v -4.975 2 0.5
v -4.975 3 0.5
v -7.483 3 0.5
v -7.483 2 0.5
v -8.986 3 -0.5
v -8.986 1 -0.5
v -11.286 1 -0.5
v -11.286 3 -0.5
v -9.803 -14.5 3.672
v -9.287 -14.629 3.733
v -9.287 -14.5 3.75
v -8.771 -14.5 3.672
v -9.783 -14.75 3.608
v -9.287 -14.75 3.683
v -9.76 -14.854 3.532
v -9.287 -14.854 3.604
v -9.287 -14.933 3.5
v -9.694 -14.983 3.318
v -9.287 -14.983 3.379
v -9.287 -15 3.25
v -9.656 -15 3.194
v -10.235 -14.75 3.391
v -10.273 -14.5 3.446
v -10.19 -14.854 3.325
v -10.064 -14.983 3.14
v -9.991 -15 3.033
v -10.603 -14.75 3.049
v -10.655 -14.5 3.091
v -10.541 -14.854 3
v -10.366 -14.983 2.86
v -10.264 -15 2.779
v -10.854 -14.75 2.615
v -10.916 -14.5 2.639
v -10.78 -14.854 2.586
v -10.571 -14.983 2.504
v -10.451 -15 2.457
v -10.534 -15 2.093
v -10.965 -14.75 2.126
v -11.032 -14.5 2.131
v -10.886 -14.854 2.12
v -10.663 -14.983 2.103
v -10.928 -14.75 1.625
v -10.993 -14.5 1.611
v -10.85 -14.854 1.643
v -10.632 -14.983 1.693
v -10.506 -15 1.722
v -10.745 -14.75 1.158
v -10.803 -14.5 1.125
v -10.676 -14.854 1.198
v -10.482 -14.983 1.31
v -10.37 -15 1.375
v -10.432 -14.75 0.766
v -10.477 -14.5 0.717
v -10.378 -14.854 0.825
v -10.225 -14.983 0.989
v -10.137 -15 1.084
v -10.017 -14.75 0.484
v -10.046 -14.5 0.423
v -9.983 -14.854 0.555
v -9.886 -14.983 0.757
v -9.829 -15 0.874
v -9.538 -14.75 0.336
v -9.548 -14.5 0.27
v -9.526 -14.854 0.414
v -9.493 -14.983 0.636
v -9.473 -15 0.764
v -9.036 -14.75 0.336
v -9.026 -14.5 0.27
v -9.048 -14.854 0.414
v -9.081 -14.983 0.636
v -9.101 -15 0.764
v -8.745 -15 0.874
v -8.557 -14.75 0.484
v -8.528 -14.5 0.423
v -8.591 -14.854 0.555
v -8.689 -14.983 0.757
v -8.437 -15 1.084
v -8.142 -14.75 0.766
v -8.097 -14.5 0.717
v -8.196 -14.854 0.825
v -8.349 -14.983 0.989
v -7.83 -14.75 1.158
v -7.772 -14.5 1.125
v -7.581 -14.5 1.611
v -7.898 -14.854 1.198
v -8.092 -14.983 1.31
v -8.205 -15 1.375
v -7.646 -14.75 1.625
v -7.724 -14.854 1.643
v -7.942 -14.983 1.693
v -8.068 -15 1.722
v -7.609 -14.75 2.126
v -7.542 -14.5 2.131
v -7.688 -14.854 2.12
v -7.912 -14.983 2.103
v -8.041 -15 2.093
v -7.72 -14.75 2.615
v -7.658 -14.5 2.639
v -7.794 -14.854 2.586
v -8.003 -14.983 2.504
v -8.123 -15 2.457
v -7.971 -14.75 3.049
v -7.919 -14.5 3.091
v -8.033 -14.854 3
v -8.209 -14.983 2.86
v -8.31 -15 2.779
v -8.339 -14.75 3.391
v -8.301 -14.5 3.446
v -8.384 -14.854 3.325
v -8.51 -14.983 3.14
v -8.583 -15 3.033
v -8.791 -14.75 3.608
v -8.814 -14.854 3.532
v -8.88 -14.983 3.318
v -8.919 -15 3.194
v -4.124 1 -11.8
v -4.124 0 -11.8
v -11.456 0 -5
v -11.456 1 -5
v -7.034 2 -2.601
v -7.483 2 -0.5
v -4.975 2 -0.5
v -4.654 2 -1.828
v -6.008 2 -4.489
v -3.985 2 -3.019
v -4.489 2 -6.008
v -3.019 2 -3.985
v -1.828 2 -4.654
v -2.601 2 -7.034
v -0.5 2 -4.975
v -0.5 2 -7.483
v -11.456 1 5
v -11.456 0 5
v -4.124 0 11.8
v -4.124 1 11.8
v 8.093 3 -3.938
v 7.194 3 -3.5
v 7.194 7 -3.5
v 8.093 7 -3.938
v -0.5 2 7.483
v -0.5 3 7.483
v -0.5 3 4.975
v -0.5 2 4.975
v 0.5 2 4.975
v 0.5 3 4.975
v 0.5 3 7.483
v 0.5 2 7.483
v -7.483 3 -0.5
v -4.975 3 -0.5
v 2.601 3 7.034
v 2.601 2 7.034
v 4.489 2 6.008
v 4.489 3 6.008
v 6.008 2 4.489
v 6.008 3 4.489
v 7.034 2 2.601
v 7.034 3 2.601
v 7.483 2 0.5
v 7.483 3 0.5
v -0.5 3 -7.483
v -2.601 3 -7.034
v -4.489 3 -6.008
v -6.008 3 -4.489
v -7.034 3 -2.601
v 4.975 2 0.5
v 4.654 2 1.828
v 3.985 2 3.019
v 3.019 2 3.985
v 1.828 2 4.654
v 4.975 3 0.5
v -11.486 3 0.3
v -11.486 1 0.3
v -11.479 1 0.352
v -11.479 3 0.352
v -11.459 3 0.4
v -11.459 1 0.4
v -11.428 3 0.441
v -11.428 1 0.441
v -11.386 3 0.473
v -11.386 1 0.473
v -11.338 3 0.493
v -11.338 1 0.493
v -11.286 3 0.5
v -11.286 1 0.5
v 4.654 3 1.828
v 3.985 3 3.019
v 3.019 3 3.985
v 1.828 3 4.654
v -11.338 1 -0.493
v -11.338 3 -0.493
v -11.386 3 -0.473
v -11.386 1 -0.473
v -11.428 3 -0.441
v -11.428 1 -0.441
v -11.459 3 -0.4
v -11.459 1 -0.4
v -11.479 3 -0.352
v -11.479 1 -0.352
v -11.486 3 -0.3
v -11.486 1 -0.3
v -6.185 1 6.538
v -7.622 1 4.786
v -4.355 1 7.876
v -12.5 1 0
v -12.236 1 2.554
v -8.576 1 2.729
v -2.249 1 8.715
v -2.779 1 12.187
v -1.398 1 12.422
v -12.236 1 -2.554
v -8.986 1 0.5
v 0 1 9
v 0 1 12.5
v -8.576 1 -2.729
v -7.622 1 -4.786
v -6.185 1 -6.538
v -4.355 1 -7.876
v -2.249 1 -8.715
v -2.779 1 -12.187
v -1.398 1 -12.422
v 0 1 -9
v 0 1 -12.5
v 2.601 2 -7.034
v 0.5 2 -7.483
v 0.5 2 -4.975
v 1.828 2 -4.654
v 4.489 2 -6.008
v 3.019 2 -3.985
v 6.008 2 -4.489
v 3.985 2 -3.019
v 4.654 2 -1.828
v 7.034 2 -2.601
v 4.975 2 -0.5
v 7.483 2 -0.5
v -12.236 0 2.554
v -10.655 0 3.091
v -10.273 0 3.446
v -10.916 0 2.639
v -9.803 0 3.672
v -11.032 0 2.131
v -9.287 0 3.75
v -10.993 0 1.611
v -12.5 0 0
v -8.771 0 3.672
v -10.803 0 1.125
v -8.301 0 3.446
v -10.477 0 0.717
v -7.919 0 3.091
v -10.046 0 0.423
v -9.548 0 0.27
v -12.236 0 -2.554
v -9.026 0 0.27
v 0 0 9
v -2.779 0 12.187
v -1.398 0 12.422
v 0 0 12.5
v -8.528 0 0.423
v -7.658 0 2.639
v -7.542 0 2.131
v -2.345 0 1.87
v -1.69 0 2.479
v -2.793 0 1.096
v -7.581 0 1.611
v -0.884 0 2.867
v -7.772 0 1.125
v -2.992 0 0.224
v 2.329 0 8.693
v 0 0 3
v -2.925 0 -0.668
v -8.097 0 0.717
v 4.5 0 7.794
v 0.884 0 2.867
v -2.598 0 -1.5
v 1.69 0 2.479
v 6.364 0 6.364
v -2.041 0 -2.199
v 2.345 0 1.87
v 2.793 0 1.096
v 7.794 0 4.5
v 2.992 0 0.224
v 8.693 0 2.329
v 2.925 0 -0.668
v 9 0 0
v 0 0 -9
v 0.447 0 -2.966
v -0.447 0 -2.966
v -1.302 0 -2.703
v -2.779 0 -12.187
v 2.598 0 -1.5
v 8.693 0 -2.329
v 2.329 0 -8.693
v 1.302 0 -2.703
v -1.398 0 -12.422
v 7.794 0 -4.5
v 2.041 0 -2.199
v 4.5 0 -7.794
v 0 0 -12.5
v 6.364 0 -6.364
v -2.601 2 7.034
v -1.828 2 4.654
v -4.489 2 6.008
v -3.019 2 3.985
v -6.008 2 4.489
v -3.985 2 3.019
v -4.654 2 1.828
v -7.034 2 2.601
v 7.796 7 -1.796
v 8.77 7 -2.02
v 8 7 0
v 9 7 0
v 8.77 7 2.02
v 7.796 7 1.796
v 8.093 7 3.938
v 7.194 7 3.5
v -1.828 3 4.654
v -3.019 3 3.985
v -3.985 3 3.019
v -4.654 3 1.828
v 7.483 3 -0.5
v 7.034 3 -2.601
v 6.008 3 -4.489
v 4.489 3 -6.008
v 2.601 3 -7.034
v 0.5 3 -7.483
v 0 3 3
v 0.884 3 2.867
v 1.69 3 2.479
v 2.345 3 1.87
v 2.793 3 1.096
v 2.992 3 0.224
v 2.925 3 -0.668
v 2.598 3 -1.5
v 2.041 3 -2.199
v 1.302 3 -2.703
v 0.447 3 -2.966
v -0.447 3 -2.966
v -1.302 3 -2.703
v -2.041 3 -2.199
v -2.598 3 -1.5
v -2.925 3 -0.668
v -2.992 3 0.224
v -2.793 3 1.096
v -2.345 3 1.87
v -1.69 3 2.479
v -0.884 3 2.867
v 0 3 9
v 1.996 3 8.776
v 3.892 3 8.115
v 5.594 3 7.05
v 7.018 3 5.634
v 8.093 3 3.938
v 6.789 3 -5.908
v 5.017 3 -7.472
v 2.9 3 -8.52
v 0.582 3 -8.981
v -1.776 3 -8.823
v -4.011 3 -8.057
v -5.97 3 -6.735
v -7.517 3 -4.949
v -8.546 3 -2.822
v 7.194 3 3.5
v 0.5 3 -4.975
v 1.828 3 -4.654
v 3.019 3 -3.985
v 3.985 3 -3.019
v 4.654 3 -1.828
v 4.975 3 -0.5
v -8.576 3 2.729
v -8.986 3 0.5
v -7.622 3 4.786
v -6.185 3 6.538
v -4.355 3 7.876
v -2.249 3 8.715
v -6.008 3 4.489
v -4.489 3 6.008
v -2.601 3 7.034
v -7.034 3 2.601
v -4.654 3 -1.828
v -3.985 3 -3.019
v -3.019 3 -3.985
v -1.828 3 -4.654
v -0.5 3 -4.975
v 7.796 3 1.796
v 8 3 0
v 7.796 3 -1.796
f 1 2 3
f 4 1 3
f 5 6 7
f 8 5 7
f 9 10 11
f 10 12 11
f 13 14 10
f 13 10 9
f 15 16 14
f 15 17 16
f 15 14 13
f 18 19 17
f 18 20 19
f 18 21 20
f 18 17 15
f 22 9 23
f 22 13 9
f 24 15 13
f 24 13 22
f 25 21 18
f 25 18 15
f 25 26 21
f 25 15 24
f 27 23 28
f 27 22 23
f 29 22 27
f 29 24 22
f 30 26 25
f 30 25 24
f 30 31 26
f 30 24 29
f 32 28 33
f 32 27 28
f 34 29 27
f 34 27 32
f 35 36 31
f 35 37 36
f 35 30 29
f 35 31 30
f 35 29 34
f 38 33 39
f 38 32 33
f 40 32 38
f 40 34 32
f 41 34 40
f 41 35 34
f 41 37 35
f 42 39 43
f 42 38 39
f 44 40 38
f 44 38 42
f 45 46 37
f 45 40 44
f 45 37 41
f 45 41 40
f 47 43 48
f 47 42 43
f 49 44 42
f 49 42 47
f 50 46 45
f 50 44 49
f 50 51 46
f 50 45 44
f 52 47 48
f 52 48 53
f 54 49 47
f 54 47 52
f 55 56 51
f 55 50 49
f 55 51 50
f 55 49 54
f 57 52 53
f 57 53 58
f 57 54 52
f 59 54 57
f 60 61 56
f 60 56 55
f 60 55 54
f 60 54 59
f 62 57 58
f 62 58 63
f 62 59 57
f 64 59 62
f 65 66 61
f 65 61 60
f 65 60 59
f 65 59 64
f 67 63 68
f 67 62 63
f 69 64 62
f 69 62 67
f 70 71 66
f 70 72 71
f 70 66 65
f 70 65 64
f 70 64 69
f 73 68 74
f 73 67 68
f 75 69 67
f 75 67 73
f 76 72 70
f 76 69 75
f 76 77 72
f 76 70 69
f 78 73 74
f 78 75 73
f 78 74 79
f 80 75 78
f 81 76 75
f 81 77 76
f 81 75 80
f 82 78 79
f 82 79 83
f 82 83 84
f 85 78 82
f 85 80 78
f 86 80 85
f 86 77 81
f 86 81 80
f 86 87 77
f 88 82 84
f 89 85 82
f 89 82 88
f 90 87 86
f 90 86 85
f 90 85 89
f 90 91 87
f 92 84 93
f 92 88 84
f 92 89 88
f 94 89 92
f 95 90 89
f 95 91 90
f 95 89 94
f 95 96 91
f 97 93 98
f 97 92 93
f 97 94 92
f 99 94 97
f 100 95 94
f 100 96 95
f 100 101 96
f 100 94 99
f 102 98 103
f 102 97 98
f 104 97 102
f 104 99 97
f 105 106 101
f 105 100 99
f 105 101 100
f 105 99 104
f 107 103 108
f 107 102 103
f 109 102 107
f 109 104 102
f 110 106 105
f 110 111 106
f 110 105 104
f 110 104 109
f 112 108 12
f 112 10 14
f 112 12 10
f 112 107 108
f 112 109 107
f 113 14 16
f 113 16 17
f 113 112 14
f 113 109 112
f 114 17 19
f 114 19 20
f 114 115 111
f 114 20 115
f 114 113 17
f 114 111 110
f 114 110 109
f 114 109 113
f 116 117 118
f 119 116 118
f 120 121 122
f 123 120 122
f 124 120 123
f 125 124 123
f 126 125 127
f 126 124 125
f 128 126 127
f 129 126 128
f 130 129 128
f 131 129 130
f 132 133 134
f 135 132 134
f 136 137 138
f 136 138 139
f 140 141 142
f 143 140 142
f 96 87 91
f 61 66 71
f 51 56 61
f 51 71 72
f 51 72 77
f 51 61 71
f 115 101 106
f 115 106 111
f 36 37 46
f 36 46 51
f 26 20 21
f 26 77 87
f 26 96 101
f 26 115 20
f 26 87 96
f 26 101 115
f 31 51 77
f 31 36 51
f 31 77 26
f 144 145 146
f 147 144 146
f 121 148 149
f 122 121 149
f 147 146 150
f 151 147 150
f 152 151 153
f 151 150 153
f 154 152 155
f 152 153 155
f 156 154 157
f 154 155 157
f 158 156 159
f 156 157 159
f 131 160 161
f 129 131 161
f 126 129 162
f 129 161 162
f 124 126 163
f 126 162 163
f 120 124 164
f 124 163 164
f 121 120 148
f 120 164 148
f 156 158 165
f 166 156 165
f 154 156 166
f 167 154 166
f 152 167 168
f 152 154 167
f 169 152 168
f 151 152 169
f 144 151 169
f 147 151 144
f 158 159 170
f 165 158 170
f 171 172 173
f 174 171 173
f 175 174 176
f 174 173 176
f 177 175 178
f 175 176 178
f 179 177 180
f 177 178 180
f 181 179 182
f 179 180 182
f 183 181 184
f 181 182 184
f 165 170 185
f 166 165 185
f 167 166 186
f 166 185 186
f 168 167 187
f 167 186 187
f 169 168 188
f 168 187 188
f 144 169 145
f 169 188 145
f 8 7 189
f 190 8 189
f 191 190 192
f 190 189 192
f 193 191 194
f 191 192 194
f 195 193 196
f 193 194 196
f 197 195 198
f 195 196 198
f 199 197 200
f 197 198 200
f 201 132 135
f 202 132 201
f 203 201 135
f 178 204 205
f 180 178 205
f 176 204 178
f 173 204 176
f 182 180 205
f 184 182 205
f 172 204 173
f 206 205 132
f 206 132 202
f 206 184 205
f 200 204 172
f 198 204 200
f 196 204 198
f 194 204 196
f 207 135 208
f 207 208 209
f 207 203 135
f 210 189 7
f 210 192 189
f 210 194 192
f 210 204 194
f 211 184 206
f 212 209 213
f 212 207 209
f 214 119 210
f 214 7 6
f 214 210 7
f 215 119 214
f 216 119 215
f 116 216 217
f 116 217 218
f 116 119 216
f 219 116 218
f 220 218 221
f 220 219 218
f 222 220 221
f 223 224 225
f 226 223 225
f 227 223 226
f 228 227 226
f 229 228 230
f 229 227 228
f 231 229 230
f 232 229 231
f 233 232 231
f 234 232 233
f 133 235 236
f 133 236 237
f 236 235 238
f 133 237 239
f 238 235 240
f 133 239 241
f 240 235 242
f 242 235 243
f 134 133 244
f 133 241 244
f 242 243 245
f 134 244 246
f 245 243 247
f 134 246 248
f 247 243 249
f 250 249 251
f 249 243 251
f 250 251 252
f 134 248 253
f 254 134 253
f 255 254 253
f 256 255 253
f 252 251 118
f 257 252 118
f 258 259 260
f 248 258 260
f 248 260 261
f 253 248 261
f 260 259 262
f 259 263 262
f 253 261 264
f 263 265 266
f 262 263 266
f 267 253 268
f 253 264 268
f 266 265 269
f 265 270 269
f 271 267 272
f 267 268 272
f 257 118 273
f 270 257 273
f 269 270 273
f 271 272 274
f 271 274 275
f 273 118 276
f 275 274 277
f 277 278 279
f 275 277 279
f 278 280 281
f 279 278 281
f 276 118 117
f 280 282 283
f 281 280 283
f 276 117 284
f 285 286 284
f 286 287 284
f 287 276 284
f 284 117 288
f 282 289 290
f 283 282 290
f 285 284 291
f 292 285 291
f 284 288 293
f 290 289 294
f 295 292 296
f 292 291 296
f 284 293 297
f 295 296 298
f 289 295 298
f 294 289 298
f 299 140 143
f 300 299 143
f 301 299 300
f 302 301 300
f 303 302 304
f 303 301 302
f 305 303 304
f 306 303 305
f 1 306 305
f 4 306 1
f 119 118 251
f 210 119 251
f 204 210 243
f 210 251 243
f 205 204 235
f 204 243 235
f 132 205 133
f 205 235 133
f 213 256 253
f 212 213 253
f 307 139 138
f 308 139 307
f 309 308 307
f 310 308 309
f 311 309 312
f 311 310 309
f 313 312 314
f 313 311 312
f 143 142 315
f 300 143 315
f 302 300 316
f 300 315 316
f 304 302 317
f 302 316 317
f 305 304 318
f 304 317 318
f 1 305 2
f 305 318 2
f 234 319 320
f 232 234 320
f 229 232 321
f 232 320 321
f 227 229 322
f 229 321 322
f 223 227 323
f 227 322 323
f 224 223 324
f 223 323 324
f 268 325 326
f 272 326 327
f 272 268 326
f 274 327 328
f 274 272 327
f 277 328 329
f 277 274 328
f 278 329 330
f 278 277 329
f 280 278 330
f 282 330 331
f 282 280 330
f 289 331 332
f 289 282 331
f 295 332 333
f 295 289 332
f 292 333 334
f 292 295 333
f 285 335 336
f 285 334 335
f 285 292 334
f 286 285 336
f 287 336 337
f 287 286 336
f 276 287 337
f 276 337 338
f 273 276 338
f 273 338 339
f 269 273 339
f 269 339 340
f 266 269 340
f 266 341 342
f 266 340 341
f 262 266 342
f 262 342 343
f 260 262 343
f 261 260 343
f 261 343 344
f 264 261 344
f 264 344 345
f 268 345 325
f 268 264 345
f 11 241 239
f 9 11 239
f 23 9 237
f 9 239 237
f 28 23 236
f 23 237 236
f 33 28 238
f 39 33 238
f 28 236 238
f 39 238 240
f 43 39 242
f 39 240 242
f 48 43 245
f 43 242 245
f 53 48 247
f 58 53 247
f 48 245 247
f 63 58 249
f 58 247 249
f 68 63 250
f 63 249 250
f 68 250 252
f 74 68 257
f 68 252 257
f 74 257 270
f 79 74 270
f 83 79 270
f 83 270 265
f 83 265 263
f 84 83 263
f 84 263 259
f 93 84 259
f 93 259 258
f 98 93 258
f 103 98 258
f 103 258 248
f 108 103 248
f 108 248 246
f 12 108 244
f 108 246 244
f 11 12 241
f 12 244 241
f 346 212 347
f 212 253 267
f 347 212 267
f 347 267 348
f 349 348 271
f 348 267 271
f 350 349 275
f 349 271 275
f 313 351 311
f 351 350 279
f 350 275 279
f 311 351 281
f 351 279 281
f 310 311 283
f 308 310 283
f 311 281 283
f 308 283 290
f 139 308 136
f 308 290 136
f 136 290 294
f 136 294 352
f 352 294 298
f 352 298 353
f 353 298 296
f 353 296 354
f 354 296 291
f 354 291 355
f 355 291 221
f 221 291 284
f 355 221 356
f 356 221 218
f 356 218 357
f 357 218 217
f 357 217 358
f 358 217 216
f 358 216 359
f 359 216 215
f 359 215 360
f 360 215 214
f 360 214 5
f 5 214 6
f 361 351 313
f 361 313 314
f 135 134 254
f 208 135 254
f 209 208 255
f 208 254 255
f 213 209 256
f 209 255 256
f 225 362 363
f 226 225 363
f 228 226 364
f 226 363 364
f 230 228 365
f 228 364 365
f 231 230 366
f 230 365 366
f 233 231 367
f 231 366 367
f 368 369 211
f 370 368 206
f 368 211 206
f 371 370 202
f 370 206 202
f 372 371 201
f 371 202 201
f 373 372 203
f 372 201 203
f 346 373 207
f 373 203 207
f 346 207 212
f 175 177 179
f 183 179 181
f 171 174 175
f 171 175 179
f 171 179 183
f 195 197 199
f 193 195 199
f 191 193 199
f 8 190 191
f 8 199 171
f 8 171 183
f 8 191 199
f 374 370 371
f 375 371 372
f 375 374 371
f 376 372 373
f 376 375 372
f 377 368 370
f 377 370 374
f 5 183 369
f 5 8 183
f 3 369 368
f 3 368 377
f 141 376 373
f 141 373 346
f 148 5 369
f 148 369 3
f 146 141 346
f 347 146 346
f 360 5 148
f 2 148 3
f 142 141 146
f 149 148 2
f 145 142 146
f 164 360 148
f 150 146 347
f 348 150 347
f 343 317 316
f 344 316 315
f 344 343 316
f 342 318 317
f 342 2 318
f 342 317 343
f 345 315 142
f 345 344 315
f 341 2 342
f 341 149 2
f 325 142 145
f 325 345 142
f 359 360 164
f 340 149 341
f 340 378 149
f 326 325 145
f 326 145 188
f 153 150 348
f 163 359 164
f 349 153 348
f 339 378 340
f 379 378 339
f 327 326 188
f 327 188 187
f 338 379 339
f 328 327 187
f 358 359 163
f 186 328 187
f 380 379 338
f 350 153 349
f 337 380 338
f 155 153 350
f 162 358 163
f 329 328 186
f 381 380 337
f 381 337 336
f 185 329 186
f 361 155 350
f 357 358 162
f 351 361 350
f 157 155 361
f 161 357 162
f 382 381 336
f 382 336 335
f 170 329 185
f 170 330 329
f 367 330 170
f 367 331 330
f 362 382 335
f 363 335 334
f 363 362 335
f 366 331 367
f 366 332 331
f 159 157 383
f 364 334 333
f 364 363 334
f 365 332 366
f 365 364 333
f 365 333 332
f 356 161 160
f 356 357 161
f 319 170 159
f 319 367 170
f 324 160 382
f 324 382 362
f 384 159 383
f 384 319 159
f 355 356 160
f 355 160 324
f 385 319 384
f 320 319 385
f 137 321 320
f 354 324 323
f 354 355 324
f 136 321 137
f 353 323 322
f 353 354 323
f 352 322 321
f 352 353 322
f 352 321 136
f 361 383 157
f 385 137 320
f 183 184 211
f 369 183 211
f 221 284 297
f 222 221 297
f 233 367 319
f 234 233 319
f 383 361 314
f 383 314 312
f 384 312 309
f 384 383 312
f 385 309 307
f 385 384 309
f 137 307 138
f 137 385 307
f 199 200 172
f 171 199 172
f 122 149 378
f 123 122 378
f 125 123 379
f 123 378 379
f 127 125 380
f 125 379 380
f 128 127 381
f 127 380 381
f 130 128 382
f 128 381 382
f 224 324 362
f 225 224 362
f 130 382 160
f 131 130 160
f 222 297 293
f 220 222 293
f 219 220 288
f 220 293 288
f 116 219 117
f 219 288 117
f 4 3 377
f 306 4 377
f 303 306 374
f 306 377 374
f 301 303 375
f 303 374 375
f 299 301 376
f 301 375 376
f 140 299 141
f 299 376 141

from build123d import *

# Parameters (mm, degrees)
SCHIZZO1_R                   = 9
SCHIZZO1_R_2                 = 3
ESTRUSIONE_ESTRUSIONE1_DEPTH = 7
TAGLIO_ESTRUSIONE1_START     = -4
TAGLIO_ESTRUSIONE1_DEPTH     = 4
TAGLIO_ESTRUSIONE2_DEPTH     = 1
RIPETIZIONECIRCOLARE1_COUNT  = 4
ESTRUSIONE_ESTRUSIONE2_DEPTH = 1
ESTRUSIONE_ESTRUSIONE3_DEPTH = 2
SCHIZZO7_R                   = 1.75
ESTRUSIONE_ESTRUSIONE4_DEPTH = 15
RACCORDO1_R                  = 0.5


with BuildPart() as part:
    # Schizzo1 → Estrusione-Estrusione1 (new body)
    with BuildSketch(Plane(origin=(0, 0, 0), x_dir=(1, 0, 0), z_dir=(0, 1, 0))):
        with Locations(Location((0, 0, 0), (0, 0, 270))):
            Circle(SCHIZZO1_R)
        with Locations(Location((0, 0, 0), (0, 0, 270))):
            Circle(SCHIZZO1_R_2, mode=Mode.SUBTRACT)
    extrude(amount=ESTRUSIONE_ESTRUSIONE1_DEPTH)

    # Schizzo3 → Taglio-Estrusione1 (cut)
    with BuildSketch(Plane(origin=(0, 7, 0), x_dir=(1, 0, 0), z_dir=(0, 1, 0)).offset(TAGLIO_ESTRUSIONE1_START)):
        with BuildLine():
            Line((7.193747285, 3.5), (8.092965696, 3.9375))
            ThreePointArc((8.092965696, 3.9375), (-9, 0), (8.092965696, -3.9375))
            Line((8.092965696, -3.9375), (7.193747285, -3.5))
            ThreePointArc((7.193747285, -3.5), (8, 0), (7.193747285, 3.5))
        make_face()
    extrude(amount=TAGLIO_ESTRUSIONE1_DEPTH, mode=Mode.SUBTRACT)

    # Schizzo4 → Taglio-Estrusione2 (cut)
    with BuildSketch(Plane(origin=(0, 3, 0), x_dir=(1, 0, 0), z_dir=(0, 1, 0))):
        with BuildLine():
            Line((-0.5, 4.974937186), (-0.5, 7.483314774))
            ThreePointArc((-0.5, 7.483314774), (-5.303300859, 5.303300859), (-7.483314774, 0.5))
            Line((-7.483314774, 0.5), (-4.974937186, 0.5))
            ThreePointArc((-4.974937186, 0.5), (-3.535533906, 3.535533906), (-0.5, 4.974937186))
        make_face()
    taglio_estrusione2 = extrude(amount=-TAGLIO_ESTRUSIONE2_DEPTH, mode=Mode.SUBTRACT)

    # RipetizioneCircolare1: Taglio-Estrusione2 ×4 about axis
    ripetizionecircolare1_axis = Axis((0, 0, 0), (0, 1, 0))
    for i in range(1, RIPETIZIONECIRCOLARE1_COUNT):
        add(taglio_estrusione2.rotate(ripetizionecircolare1_axis, i * 360 / RIPETIZIONECIRCOLARE1_COUNT), mode=Mode.SUBTRACT)

    # Schizzo5 → Estrusione-Estrusione2 (add)
    with BuildSketch(Plane(origin=(0, 0, 0), x_dir=(1, 0, 0), z_dir=(0, 1, 0))):
        with BuildLine():
            Line((0, 9), (0, 12.5))
            ThreePointArc((0, 12.5), (-2.091650066, 12.323757544), (-4.124318125, 11.8))
            Line((-4.124318125, 11.8), (-11.456439237, 5))
            ThreePointArc((-11.456439237, 5), (-12.5, 0), (-11.456439237, -5))
            Line((-11.456439237, -5), (-4.124318125, -11.8))
            ThreePointArc((-4.124318125, -11.8), (-2.091650066, -12.323757544), (0, -12.5))
            Line((0, -12.5), (0, -9))
            ThreePointArc((0, -9), (-9, 0), (0, 9))
        make_face()
    extrude(amount=ESTRUSIONE_ESTRUSIONE2_DEPTH)

    # Schizzo6 → Estrusione-Estrusione3 (add)
    with BuildSketch(Plane(origin=(0, 1, 0), x_dir=(1, 0, 0), z_dir=(0, 1, 0))):
        with BuildLine():
            Line((-8.986100378, 0.5), (-11.286100378, 0.5))
            ThreePointArc((-11.286100378, 0.5), (-11.427521734, 0.441421356), (-11.486100378, 0.3))
            Line((-11.486100378, 0.3), (-11.486100378, -0.3))
            ThreePointArc((-11.486100378, -0.3), (-11.427521734, -0.441421356), (-11.286100378, -0.5))
            Line((-11.286100378, -0.5), (-8.986100378, -0.5))
            ThreePointArc((-8.986100378, -0.5), (-9, 0), (-8.986100378, 0.5))
        make_face()
    extrude(amount=ESTRUSIONE_ESTRUSIONE3_DEPTH)

    # Schizzo7 → Estrusione-Estrusione4 (add)
    with BuildSketch(Plane.XZ):
        with Locations(Location((-9.287087811, 2, 0), (0, 0, 90))):
            Circle(SCHIZZO7_R)
    extrude(amount=ESTRUSIONE_ESTRUSIONE4_DEPTH)

    # Raccordo1
    raccordo1_edges = [part.edges().sort_by_distance(p)[0] for p in [
        (-9.287087811, -15, 0.25),
    ]]
    fillet(raccordo1_edges, radius=RACCORDO1_R)


solid = part.part
